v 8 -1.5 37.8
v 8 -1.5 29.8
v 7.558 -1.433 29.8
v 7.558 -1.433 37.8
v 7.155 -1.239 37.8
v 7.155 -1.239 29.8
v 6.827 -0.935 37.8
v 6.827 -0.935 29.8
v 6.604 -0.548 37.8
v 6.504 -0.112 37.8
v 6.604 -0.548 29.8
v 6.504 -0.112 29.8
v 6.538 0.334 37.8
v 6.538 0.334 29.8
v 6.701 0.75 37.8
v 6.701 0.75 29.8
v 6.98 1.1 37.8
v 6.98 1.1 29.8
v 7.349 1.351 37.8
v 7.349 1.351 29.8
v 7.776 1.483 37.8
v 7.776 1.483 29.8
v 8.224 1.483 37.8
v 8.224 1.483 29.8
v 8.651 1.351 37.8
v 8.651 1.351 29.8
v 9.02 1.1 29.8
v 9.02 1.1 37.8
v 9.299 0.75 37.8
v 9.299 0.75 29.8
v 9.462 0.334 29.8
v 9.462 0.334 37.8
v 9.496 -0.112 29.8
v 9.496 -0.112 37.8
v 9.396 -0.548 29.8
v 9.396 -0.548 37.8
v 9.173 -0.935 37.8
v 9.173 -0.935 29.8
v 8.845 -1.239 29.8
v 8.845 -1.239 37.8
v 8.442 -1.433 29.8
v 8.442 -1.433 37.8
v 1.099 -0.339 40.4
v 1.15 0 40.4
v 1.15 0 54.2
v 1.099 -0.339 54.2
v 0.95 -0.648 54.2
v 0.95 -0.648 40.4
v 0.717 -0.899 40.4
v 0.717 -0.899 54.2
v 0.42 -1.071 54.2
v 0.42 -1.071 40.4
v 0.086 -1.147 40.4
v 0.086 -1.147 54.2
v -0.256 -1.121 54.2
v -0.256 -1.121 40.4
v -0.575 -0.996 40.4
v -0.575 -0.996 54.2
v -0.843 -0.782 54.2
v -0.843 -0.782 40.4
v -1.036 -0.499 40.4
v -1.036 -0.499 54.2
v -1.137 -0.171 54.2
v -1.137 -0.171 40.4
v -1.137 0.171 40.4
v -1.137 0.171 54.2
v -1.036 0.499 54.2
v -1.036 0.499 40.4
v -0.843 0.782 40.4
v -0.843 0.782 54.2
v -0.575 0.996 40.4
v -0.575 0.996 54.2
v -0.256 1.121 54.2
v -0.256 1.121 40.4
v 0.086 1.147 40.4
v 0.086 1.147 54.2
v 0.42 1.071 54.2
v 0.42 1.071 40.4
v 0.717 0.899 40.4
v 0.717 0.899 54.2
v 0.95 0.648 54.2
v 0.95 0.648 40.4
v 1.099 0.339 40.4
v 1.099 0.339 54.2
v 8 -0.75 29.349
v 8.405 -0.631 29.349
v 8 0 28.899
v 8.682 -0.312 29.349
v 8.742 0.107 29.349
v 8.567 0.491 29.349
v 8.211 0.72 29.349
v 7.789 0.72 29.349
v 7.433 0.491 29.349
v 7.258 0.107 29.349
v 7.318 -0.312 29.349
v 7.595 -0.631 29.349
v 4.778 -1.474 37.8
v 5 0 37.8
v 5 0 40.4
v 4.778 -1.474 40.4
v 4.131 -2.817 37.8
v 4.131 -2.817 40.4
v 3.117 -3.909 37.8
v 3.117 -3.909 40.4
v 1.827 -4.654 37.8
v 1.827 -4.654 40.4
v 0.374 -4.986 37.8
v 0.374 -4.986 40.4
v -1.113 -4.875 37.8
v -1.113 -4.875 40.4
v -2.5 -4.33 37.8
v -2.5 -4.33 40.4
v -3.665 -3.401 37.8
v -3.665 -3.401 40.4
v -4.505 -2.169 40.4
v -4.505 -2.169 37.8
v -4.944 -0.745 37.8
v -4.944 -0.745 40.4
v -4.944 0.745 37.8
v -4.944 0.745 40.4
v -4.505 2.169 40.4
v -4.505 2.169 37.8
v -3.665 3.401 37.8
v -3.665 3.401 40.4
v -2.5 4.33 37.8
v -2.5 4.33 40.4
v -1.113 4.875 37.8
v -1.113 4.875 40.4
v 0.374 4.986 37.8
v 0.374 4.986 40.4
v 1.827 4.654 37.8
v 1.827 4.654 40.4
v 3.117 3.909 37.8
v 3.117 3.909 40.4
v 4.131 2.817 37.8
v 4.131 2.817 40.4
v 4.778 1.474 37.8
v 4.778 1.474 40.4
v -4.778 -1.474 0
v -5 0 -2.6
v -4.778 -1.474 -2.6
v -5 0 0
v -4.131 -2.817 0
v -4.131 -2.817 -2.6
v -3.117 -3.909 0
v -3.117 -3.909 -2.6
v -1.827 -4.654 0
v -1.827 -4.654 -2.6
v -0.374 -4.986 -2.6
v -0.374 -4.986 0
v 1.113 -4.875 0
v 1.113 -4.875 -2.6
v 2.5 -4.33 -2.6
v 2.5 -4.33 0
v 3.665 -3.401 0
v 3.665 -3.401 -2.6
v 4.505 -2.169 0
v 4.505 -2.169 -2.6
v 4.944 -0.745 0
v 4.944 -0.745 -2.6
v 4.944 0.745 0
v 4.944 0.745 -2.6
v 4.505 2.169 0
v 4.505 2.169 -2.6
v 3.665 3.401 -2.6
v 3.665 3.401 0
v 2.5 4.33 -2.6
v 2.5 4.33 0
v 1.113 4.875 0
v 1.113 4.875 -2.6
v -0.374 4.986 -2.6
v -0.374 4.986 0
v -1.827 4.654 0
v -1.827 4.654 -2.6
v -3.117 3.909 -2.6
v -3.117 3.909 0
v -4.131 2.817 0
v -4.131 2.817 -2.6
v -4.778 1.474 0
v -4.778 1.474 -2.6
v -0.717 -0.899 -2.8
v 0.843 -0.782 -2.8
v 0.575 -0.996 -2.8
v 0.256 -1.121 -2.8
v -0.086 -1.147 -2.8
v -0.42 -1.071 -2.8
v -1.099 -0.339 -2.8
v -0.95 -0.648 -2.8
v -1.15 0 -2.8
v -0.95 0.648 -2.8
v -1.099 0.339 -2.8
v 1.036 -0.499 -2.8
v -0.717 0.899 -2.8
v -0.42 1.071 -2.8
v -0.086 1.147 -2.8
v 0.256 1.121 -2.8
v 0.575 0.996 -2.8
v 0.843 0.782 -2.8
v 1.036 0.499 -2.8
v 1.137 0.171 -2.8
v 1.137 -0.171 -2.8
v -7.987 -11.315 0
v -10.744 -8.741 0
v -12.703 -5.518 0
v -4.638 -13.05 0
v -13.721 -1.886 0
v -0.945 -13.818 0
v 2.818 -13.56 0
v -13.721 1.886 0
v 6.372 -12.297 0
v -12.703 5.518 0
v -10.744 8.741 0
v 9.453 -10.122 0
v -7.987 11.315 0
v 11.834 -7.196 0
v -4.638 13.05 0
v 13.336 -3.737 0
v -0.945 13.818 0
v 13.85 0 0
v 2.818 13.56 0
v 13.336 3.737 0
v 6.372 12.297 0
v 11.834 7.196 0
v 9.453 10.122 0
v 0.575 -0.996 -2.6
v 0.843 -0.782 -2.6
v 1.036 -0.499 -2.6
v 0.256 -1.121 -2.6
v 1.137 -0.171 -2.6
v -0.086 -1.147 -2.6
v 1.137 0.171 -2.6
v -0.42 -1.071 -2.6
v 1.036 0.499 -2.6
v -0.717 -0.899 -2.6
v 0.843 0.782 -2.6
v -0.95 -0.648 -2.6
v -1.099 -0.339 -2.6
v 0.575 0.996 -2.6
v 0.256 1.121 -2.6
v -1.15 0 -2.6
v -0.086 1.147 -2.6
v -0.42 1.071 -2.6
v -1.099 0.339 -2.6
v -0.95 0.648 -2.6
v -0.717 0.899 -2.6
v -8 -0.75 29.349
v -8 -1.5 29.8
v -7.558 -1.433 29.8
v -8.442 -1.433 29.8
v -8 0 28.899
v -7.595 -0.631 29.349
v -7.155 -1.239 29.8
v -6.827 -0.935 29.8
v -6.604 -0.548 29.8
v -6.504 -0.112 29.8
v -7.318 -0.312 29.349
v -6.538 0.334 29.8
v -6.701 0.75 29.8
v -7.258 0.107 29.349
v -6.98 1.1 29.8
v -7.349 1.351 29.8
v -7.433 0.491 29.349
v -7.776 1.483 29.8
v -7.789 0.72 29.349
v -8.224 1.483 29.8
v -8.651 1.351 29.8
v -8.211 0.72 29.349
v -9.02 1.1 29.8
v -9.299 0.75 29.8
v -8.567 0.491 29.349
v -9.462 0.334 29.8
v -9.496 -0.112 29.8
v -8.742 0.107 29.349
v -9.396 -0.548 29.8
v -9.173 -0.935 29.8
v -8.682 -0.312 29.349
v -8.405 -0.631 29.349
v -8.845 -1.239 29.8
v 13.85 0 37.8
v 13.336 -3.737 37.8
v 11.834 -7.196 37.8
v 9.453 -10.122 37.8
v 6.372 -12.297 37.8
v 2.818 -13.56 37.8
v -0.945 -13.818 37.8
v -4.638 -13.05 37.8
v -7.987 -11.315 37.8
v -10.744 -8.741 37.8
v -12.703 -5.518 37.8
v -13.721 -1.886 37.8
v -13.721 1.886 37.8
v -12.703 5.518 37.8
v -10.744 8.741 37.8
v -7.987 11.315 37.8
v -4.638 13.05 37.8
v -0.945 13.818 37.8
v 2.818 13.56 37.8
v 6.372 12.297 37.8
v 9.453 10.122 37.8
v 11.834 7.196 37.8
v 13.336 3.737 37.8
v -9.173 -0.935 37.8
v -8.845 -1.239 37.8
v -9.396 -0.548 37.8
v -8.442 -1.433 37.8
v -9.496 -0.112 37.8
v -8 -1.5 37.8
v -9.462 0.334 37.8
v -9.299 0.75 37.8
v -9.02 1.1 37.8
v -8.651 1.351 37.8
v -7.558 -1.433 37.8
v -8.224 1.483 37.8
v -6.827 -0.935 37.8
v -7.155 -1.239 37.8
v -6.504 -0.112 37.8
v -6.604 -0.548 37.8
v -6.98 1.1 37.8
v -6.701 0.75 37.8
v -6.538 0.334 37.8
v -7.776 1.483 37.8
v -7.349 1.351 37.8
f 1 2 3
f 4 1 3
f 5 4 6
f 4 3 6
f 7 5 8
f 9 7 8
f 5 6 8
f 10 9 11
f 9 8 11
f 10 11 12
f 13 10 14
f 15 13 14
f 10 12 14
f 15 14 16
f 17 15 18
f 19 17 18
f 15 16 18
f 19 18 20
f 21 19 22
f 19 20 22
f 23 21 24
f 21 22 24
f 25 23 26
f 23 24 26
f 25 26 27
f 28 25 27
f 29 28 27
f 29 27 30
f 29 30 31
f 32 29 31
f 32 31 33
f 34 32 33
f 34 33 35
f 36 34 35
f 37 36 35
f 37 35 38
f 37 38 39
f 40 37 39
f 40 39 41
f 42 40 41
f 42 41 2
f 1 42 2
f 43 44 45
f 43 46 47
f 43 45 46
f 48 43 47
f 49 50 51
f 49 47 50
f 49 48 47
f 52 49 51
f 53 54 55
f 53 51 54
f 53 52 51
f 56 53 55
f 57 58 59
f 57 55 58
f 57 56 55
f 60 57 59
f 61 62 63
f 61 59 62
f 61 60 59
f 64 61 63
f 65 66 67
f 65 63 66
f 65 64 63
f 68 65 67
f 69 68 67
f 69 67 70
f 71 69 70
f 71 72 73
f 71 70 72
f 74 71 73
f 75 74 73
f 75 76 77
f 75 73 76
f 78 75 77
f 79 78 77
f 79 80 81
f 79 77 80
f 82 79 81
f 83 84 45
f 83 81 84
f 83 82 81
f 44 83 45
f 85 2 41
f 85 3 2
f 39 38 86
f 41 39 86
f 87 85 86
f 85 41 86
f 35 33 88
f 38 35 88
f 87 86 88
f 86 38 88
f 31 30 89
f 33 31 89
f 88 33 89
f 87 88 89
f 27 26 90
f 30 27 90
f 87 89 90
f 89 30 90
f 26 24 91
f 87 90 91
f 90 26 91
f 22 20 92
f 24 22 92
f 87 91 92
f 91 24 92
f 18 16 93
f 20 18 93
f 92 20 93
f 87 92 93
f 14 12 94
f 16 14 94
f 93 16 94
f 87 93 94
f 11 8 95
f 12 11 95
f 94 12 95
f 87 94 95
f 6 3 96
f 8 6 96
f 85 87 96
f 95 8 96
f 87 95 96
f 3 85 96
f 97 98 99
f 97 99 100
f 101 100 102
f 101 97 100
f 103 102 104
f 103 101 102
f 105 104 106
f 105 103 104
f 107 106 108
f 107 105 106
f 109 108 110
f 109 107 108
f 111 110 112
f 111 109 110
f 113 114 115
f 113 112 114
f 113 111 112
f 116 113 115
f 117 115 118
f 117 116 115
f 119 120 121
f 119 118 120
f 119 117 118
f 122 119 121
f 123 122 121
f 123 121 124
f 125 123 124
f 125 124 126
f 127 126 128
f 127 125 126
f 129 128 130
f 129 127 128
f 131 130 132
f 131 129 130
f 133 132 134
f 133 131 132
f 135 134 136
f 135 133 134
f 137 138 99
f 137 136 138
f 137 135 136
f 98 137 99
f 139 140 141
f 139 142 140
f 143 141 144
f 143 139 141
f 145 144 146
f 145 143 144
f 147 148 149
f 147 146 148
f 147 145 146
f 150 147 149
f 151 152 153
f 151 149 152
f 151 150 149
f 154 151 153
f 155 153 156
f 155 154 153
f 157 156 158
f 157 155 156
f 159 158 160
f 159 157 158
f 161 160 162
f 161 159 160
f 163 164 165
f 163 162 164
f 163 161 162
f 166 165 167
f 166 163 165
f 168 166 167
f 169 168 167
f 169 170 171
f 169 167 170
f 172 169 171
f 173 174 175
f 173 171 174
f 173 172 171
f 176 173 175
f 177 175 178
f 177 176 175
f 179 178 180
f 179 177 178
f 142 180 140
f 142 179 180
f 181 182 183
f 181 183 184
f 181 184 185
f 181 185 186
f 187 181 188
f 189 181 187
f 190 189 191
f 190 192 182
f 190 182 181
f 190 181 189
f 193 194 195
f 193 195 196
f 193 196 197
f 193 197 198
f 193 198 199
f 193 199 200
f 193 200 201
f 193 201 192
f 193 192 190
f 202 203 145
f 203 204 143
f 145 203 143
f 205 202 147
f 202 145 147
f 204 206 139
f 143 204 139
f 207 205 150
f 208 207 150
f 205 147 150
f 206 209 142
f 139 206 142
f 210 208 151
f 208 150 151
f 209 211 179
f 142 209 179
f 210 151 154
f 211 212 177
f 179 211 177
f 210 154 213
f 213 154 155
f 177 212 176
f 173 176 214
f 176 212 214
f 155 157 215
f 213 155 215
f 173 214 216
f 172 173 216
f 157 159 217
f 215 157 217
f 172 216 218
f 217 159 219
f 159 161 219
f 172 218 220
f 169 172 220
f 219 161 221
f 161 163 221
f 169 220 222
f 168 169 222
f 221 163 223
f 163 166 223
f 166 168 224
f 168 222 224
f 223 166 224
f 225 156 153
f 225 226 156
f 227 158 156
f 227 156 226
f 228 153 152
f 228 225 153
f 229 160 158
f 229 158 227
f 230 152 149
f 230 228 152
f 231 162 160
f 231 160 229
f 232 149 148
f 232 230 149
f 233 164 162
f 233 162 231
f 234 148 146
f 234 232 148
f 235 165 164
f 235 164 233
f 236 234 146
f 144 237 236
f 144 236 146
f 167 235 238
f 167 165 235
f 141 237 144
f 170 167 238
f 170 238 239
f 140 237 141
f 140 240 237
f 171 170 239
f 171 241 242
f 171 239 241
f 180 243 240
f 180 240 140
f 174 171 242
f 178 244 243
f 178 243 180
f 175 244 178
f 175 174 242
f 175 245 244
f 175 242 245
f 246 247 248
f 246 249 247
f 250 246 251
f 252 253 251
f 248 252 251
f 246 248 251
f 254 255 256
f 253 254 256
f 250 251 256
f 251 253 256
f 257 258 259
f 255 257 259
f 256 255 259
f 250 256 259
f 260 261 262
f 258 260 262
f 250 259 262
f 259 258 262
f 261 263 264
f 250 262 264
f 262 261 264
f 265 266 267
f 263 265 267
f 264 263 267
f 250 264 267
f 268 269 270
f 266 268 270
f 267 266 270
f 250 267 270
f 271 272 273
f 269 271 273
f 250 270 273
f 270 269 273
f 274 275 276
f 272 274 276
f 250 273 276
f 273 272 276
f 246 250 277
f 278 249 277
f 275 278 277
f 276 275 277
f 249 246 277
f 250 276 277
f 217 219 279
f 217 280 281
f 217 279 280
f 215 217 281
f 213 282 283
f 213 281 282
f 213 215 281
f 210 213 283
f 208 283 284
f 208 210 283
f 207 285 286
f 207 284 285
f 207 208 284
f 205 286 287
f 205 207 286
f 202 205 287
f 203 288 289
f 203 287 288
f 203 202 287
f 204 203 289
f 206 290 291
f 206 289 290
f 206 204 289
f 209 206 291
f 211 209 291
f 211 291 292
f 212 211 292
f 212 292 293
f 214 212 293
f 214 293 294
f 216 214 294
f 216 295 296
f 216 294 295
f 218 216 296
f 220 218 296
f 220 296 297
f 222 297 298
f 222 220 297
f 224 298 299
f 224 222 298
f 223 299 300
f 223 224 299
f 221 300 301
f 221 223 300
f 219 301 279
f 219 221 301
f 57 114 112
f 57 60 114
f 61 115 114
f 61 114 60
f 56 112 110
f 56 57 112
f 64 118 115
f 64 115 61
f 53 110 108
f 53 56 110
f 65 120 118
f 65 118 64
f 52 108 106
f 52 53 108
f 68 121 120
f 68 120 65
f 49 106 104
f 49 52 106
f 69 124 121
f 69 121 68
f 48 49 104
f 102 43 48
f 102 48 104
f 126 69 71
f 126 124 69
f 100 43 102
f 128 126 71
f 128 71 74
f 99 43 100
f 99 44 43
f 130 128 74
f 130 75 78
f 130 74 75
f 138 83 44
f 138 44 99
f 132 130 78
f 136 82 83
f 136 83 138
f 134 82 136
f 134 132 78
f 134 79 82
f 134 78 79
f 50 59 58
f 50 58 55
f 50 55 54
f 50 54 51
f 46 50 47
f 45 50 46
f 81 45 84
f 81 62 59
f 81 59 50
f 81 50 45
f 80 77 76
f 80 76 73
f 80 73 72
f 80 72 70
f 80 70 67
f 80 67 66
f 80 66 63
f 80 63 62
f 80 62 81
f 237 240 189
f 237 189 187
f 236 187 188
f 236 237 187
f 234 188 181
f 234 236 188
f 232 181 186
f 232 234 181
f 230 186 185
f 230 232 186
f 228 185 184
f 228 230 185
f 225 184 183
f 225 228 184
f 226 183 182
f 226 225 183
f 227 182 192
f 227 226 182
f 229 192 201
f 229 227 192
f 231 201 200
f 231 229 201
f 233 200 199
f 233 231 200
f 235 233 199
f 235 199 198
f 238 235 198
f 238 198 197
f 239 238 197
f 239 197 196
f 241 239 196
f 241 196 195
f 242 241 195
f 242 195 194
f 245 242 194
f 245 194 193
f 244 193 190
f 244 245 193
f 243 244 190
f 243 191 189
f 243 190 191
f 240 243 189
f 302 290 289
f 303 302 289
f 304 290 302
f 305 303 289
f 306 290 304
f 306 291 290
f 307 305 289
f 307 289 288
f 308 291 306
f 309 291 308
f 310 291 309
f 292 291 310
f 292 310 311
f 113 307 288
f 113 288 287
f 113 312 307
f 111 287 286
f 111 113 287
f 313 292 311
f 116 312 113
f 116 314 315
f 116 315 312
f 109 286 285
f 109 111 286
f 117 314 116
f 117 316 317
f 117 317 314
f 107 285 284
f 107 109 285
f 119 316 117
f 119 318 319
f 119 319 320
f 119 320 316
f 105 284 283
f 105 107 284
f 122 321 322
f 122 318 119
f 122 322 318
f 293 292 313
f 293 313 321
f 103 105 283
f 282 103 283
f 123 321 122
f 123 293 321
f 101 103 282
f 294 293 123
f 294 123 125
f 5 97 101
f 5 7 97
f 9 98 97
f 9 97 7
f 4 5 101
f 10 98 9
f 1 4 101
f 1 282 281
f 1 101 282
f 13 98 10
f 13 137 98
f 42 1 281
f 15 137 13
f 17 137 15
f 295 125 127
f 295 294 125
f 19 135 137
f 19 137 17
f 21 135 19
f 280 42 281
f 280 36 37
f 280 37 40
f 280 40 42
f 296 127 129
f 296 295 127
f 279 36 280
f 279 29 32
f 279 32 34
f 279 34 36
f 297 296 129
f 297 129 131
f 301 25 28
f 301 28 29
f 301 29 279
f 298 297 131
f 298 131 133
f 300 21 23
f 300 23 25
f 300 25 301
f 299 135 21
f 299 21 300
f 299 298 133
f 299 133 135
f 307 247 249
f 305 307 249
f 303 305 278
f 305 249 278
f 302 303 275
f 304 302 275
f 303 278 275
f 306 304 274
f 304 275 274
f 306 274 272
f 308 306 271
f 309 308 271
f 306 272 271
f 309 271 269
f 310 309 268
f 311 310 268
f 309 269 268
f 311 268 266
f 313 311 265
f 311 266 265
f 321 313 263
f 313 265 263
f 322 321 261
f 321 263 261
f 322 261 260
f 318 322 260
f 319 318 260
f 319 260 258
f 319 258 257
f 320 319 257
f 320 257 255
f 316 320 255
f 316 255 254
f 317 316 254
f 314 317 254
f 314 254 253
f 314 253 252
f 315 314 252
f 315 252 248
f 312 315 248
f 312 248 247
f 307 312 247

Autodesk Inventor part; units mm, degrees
ref_plane "YZ Plane" through (0, 0, 0) normal (1, 0, 0) x (0, 1, 0)
ref_plane "XZ Plane" through (0, 0, 0) normal (0, 1, 0) x (-1, 0, 0)
ref_plane "XY Plane" through (0, 0, 0) normal (0, 0, 1) x (1, 0, 0)
sketch "スケッチ1" plane through (0, 0, 0) normal (0, 0, 1) x (1, 0, 0)
  circle A0 centre (0, 0) radius 13.85
  dimension "d0" = 27.7
extrude "押し出し1" add sketch "スケッチ1" along normal blind 37.8
sketch "スケッチ2" plane through (0, 0, 37.8) normal (0, 0, 1) x (1, 0, 0)
  circle A0 centre (0, 0) radius 5
  dimension "d3" = 10
extrude "押し出し2" add sketch "スケッチ2" along normal blind 2.6
sketch "スケッチ3" plane through (0, 0, 40.4) normal (0, 0, 1) x (1, 0, 0)
  circle A0 centre (0, 0) radius 1.15
  dimension "d6" = 2.3
extrude "押し出し3" add sketch "スケッチ3" along normal blind 13.8
sketch "スケッチ4" plane through (0, 0, 0) normal (0, 0, -1) x (-1, 0, 0)
  circle A0 centre (0, 0) radius 1.15 projected
  circle A1 centre (0, 0) radius 5
  dimension "d9" = 10
extrude "押し出し4" add sketch "スケッチ4" along normal blind 2.6
extrude "押し出し5" add sketch "スケッチ4" along normal blind 2.8 contours A0
sketch "スケッチ5" plane through (0, 0, 37.8) normal (0, 0, 1) x (1, 0, 0)
  circle A0 centre (-8, 0) radius 1.3
  circle A1 centre (8, 0) radius 1.3
  line L0 (-8, 0) -> (8, 0)
  point P0 (0, 0)
  point P1 (0, 0)
  dimension "d14" = 2.6
  dimension "d15" = 2.6
  dimension "d16" = 16
  dimension "d17" = 8
hole "穴1" at (-8, 0, 37.8) at (8, 0, 37.8) direction (0, 0, -1) diameter 3 depth 8 tip angle 118
properties part number "マブチモーター　RS-380PH"
